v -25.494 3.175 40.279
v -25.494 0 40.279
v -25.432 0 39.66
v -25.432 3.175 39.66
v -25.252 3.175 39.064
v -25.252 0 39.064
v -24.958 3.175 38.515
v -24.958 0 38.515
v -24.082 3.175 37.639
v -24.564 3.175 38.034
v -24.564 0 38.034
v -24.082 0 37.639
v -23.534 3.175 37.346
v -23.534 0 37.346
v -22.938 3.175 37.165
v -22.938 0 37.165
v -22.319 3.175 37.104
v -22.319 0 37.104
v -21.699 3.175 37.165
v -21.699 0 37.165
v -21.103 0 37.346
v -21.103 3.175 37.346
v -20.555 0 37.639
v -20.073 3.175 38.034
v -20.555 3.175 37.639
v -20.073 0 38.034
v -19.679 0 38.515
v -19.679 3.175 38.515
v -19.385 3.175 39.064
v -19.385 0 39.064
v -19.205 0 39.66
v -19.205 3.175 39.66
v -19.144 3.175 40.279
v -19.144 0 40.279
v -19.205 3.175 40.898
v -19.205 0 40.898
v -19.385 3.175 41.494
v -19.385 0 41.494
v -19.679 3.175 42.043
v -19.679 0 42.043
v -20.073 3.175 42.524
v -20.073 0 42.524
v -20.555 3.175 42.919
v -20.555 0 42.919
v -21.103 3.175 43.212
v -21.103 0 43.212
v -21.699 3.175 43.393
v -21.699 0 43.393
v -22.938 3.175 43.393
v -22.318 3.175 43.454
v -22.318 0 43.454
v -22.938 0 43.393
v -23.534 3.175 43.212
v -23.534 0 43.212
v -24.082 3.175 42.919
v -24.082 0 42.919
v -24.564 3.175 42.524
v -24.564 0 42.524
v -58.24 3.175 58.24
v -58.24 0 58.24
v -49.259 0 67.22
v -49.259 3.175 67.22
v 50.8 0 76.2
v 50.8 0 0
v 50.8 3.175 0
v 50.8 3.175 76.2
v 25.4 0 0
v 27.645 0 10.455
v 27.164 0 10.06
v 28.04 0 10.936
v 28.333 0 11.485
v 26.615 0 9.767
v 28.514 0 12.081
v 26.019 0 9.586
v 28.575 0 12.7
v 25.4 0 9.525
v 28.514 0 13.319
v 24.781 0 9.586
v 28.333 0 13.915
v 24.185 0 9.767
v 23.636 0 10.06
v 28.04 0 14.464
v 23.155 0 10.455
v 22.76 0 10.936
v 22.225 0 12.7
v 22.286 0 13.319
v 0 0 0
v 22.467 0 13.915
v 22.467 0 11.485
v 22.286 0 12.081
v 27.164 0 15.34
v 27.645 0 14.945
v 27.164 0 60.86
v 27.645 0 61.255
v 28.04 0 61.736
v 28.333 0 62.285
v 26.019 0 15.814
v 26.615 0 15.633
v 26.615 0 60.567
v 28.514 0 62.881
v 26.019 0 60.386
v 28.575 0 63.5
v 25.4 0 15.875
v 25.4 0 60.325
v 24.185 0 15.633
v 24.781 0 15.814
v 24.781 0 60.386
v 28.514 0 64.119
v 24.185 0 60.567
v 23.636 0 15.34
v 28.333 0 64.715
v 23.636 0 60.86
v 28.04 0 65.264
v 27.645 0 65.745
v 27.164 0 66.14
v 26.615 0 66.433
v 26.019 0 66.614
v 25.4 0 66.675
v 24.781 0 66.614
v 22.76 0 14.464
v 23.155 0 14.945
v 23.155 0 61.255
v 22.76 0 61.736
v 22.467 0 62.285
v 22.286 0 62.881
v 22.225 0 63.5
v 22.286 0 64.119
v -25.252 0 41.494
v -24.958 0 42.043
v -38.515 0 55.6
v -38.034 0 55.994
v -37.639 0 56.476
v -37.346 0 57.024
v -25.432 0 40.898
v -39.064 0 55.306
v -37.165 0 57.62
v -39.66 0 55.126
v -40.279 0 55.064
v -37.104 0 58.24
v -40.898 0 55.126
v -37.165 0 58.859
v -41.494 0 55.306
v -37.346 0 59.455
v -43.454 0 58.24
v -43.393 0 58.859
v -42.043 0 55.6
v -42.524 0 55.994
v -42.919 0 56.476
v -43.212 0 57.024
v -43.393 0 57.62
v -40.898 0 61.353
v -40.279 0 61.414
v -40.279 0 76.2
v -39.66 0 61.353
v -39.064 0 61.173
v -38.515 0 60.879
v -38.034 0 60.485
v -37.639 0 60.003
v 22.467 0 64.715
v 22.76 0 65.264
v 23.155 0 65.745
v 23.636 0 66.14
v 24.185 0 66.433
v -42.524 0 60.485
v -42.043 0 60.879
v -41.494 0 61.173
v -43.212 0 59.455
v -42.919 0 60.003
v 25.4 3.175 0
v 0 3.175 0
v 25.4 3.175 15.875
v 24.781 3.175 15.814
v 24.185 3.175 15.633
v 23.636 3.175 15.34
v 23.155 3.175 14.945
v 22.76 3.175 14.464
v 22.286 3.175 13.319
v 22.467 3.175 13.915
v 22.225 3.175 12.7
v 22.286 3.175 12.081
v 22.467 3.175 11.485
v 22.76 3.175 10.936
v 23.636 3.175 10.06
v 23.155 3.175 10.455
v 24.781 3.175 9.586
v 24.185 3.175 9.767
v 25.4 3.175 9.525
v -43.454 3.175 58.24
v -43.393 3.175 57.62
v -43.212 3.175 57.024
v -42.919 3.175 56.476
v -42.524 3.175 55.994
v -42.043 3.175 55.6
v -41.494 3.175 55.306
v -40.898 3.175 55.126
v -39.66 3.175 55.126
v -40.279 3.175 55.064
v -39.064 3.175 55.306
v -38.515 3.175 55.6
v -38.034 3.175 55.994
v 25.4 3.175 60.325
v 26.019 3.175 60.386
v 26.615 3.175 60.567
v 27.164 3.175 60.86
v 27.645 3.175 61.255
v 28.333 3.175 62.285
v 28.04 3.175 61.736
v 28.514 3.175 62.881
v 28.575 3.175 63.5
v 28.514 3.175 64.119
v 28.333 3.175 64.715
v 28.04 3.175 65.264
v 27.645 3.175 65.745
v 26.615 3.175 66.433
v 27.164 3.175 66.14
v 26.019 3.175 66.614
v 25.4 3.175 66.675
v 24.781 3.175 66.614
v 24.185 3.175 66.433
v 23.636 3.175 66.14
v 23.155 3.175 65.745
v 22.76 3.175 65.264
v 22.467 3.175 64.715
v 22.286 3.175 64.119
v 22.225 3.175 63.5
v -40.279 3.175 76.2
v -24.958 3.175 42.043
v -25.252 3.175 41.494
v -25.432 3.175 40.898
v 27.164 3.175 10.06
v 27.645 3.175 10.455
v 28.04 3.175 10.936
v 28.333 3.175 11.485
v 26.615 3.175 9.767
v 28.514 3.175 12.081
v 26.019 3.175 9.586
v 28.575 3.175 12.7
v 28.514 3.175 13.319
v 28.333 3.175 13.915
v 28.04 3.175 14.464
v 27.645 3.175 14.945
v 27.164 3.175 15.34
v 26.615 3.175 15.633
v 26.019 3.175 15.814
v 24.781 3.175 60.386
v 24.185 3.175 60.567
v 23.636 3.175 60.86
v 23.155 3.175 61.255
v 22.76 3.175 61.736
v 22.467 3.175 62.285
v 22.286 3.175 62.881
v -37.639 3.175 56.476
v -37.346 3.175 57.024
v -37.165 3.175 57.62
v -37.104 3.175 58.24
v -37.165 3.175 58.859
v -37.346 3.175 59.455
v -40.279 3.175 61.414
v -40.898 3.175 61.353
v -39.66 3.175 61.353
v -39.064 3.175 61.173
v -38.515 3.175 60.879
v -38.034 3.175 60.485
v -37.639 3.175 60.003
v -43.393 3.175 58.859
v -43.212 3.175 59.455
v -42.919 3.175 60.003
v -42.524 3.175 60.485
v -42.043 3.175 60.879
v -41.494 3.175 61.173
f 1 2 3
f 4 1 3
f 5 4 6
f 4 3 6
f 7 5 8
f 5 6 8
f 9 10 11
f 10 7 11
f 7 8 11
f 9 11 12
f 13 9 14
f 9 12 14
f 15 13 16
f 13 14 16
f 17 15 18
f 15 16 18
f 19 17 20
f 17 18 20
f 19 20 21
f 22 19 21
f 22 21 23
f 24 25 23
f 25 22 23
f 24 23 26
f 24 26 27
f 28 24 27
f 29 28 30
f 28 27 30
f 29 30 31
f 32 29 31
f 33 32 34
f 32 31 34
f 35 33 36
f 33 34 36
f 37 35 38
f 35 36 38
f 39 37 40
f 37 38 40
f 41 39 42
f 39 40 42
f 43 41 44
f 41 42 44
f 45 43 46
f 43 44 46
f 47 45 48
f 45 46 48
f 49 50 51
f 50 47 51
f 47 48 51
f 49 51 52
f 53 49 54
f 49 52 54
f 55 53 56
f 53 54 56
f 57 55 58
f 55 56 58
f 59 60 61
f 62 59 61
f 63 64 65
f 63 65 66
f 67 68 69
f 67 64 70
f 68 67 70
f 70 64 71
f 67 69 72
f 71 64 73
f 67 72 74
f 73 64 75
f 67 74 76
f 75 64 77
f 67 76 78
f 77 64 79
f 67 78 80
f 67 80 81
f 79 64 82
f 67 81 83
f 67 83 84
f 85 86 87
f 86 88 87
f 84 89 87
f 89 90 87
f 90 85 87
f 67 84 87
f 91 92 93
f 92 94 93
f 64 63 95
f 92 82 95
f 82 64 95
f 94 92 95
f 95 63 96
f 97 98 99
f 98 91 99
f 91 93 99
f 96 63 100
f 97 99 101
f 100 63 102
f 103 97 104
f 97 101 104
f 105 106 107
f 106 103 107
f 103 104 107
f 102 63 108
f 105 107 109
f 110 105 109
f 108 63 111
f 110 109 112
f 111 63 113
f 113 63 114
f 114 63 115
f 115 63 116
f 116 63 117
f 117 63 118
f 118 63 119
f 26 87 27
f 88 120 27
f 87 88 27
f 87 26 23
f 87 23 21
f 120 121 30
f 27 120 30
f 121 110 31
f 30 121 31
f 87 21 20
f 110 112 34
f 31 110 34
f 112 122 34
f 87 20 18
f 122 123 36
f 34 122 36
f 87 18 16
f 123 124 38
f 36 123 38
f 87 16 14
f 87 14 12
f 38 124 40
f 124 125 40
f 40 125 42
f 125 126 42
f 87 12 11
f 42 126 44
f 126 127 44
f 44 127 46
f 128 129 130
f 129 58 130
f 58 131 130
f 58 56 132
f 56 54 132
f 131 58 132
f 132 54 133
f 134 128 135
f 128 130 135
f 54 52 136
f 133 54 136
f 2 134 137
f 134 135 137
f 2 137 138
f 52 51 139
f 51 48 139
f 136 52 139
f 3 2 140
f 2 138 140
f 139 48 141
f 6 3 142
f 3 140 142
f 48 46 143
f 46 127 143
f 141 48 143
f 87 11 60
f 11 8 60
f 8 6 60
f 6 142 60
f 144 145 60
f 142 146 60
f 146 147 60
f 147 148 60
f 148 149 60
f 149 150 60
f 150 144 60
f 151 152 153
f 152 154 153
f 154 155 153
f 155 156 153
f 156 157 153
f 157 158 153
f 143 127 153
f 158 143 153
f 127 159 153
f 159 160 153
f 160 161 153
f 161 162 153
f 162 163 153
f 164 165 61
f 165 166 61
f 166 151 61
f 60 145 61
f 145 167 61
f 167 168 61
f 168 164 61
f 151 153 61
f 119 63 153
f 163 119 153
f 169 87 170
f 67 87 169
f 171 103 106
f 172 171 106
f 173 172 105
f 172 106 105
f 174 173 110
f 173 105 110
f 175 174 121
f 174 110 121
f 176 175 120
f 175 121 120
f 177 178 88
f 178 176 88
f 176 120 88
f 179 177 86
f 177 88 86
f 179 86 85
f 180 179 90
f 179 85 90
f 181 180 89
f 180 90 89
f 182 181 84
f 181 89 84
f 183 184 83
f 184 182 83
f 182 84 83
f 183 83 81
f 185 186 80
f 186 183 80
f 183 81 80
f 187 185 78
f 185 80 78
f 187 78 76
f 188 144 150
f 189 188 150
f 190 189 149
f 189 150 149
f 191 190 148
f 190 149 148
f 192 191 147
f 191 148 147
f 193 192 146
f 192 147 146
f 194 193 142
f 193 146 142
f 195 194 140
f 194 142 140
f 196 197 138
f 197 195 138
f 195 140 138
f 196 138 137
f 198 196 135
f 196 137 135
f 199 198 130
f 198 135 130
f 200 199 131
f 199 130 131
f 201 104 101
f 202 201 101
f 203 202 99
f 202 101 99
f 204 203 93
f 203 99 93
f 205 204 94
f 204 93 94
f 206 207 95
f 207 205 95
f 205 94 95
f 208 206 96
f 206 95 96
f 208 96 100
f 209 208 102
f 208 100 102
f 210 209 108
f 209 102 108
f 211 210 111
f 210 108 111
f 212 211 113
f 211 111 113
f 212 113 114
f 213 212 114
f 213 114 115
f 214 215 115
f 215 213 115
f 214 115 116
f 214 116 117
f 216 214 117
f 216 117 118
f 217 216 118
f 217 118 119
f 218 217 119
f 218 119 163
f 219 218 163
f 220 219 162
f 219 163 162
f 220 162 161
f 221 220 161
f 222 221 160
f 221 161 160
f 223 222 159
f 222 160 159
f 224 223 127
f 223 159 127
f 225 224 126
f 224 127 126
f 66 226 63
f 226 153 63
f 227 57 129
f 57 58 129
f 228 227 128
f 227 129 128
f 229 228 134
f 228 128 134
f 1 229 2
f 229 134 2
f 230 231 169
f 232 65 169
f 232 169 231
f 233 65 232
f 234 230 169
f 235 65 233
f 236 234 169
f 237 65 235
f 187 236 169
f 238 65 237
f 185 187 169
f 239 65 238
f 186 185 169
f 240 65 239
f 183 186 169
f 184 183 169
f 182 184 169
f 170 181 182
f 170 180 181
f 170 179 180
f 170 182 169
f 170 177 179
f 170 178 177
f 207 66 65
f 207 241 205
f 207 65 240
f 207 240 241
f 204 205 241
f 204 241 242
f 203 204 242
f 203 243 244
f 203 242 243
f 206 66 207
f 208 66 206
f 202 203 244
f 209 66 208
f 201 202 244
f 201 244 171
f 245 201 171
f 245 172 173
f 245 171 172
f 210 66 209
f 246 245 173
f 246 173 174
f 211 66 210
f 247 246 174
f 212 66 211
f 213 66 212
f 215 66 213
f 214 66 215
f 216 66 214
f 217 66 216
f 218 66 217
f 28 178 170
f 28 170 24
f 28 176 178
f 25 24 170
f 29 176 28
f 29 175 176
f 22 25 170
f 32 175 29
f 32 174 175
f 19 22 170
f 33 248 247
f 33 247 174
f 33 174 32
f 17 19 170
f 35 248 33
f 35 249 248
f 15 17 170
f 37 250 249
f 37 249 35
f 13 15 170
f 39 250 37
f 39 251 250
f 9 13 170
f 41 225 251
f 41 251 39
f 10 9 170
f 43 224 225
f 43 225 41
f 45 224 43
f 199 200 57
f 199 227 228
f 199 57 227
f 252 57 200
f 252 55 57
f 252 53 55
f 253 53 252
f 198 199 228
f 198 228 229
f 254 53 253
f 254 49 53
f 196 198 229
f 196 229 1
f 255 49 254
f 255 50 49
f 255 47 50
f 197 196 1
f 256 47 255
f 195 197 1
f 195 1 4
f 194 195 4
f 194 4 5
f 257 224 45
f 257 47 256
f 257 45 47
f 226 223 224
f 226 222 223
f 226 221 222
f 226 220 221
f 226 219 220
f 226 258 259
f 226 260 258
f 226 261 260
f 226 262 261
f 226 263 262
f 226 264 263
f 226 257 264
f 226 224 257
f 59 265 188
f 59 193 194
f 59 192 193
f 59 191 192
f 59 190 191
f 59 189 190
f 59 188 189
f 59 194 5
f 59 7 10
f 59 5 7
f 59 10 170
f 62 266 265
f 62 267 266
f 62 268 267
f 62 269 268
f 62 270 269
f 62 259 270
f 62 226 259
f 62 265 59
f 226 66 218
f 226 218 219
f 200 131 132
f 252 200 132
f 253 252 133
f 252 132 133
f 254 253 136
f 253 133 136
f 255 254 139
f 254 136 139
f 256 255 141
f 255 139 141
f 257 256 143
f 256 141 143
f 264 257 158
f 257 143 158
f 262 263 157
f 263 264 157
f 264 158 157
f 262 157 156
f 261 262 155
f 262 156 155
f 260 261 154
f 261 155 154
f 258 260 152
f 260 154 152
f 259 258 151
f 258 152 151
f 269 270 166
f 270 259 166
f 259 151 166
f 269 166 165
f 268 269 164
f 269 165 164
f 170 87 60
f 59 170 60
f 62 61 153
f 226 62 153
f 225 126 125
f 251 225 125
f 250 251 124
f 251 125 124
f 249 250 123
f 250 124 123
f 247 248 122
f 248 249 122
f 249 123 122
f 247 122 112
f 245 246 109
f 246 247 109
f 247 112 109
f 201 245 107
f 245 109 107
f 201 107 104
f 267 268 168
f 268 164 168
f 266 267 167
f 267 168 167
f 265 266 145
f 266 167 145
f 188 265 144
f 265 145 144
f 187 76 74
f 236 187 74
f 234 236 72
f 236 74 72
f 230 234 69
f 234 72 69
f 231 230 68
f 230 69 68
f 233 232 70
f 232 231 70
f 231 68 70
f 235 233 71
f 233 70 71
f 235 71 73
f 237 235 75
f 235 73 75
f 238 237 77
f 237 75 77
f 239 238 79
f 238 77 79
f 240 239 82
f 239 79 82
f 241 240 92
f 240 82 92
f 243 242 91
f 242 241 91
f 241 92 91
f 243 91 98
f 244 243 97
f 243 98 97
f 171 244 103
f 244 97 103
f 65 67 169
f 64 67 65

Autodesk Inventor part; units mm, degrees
ref_plane "YZ Plane" through (0, 0, 0) normal (1, 0, 0) x (0, 1, 0)
ref_plane "XZ Plane" through (0, 0, 0) normal (0, 1, 0) x (-1, 0, 0)
ref_plane "XY Plane" through (0, 0, 0) normal (0, 0, 1) x (1, 0, 0)
sketch "Sketch1" plane through (0, 0, 0) normal (0, 1, 0) x (-1, 0, 0)
  line L0 (0, 0) -> (-50.8, 0)
  line L1 (0, 0) -> (50.8, 0) construction
  line L2 (-25.4, 0) -> (-25.4, 12.7)
  line L3 (-25.4, 0) -> (-12.7, 0) construction
  circle A0 centre (-25.4, 12.7) radius 3.175
  line L4 (-25.4, 12.7) -> (-25.4, 63.5)
  circle A1 centre (-25.4, 63.5) radius 3.175
  line L5 (-50.8, 0) -> (-50.8, 76.2)
  line L6 (-50.8, 0) -> (25.4, 0) construction
  line L7 (0, 0) -> (76.2, 76.2)
  line L8 (0, 0) -> (107.7631, 0) construction
  line L9 (76.2, 76.2) -> (-50.8, 76.2)
  line L10 (76.2, 76.2) -> (58.2395, 58.2395)
  line L11 (76.2, 76.2) -> (101.6, 76.2) construction
  line L12 (58.2395, 58.2395) -> (40.279, 76.2)
  line L13 (49.2592, 67.2197) -> (40.279, 58.2395)
  line L14 (49.2592, 67.2197) -> (61.9592, 67.2197) construction
  line L15 (40.279, 58.2395) -> (22.3185, 40.279)
  circle A2 centre (22.3185, 40.279) radius 3.175
  circle A3 centre (40.279, 58.2395) radius 3.175
  dimension "d0" = 50.8
  dimension "d1" = 180
  dimension "d2" = 12.7
  dimension "d3" = 90
  dimension "d4" = 6.35
  dimension "d5" = 50.8
  dimension "d6" = 6.35
  dimension "d7" = 76.2
  dimension "d8" = 90
  dimension "d9" = 45
  dimension "d10" = 25.4
  dimension "d11" = 135
  dimension "d12" = 12.7
  dimension "d13" = 135
  dimension "d14" = 25.4
  dimension "d15" = 180
  dimension "d16" = 6.35
  dimension "d17" = 6.35
extrude "Extrusion1" add sketch "Sketch1" along normal blind 3.175 contours L0 L5 L9 L12 L7
properties part number "SideGusset"
